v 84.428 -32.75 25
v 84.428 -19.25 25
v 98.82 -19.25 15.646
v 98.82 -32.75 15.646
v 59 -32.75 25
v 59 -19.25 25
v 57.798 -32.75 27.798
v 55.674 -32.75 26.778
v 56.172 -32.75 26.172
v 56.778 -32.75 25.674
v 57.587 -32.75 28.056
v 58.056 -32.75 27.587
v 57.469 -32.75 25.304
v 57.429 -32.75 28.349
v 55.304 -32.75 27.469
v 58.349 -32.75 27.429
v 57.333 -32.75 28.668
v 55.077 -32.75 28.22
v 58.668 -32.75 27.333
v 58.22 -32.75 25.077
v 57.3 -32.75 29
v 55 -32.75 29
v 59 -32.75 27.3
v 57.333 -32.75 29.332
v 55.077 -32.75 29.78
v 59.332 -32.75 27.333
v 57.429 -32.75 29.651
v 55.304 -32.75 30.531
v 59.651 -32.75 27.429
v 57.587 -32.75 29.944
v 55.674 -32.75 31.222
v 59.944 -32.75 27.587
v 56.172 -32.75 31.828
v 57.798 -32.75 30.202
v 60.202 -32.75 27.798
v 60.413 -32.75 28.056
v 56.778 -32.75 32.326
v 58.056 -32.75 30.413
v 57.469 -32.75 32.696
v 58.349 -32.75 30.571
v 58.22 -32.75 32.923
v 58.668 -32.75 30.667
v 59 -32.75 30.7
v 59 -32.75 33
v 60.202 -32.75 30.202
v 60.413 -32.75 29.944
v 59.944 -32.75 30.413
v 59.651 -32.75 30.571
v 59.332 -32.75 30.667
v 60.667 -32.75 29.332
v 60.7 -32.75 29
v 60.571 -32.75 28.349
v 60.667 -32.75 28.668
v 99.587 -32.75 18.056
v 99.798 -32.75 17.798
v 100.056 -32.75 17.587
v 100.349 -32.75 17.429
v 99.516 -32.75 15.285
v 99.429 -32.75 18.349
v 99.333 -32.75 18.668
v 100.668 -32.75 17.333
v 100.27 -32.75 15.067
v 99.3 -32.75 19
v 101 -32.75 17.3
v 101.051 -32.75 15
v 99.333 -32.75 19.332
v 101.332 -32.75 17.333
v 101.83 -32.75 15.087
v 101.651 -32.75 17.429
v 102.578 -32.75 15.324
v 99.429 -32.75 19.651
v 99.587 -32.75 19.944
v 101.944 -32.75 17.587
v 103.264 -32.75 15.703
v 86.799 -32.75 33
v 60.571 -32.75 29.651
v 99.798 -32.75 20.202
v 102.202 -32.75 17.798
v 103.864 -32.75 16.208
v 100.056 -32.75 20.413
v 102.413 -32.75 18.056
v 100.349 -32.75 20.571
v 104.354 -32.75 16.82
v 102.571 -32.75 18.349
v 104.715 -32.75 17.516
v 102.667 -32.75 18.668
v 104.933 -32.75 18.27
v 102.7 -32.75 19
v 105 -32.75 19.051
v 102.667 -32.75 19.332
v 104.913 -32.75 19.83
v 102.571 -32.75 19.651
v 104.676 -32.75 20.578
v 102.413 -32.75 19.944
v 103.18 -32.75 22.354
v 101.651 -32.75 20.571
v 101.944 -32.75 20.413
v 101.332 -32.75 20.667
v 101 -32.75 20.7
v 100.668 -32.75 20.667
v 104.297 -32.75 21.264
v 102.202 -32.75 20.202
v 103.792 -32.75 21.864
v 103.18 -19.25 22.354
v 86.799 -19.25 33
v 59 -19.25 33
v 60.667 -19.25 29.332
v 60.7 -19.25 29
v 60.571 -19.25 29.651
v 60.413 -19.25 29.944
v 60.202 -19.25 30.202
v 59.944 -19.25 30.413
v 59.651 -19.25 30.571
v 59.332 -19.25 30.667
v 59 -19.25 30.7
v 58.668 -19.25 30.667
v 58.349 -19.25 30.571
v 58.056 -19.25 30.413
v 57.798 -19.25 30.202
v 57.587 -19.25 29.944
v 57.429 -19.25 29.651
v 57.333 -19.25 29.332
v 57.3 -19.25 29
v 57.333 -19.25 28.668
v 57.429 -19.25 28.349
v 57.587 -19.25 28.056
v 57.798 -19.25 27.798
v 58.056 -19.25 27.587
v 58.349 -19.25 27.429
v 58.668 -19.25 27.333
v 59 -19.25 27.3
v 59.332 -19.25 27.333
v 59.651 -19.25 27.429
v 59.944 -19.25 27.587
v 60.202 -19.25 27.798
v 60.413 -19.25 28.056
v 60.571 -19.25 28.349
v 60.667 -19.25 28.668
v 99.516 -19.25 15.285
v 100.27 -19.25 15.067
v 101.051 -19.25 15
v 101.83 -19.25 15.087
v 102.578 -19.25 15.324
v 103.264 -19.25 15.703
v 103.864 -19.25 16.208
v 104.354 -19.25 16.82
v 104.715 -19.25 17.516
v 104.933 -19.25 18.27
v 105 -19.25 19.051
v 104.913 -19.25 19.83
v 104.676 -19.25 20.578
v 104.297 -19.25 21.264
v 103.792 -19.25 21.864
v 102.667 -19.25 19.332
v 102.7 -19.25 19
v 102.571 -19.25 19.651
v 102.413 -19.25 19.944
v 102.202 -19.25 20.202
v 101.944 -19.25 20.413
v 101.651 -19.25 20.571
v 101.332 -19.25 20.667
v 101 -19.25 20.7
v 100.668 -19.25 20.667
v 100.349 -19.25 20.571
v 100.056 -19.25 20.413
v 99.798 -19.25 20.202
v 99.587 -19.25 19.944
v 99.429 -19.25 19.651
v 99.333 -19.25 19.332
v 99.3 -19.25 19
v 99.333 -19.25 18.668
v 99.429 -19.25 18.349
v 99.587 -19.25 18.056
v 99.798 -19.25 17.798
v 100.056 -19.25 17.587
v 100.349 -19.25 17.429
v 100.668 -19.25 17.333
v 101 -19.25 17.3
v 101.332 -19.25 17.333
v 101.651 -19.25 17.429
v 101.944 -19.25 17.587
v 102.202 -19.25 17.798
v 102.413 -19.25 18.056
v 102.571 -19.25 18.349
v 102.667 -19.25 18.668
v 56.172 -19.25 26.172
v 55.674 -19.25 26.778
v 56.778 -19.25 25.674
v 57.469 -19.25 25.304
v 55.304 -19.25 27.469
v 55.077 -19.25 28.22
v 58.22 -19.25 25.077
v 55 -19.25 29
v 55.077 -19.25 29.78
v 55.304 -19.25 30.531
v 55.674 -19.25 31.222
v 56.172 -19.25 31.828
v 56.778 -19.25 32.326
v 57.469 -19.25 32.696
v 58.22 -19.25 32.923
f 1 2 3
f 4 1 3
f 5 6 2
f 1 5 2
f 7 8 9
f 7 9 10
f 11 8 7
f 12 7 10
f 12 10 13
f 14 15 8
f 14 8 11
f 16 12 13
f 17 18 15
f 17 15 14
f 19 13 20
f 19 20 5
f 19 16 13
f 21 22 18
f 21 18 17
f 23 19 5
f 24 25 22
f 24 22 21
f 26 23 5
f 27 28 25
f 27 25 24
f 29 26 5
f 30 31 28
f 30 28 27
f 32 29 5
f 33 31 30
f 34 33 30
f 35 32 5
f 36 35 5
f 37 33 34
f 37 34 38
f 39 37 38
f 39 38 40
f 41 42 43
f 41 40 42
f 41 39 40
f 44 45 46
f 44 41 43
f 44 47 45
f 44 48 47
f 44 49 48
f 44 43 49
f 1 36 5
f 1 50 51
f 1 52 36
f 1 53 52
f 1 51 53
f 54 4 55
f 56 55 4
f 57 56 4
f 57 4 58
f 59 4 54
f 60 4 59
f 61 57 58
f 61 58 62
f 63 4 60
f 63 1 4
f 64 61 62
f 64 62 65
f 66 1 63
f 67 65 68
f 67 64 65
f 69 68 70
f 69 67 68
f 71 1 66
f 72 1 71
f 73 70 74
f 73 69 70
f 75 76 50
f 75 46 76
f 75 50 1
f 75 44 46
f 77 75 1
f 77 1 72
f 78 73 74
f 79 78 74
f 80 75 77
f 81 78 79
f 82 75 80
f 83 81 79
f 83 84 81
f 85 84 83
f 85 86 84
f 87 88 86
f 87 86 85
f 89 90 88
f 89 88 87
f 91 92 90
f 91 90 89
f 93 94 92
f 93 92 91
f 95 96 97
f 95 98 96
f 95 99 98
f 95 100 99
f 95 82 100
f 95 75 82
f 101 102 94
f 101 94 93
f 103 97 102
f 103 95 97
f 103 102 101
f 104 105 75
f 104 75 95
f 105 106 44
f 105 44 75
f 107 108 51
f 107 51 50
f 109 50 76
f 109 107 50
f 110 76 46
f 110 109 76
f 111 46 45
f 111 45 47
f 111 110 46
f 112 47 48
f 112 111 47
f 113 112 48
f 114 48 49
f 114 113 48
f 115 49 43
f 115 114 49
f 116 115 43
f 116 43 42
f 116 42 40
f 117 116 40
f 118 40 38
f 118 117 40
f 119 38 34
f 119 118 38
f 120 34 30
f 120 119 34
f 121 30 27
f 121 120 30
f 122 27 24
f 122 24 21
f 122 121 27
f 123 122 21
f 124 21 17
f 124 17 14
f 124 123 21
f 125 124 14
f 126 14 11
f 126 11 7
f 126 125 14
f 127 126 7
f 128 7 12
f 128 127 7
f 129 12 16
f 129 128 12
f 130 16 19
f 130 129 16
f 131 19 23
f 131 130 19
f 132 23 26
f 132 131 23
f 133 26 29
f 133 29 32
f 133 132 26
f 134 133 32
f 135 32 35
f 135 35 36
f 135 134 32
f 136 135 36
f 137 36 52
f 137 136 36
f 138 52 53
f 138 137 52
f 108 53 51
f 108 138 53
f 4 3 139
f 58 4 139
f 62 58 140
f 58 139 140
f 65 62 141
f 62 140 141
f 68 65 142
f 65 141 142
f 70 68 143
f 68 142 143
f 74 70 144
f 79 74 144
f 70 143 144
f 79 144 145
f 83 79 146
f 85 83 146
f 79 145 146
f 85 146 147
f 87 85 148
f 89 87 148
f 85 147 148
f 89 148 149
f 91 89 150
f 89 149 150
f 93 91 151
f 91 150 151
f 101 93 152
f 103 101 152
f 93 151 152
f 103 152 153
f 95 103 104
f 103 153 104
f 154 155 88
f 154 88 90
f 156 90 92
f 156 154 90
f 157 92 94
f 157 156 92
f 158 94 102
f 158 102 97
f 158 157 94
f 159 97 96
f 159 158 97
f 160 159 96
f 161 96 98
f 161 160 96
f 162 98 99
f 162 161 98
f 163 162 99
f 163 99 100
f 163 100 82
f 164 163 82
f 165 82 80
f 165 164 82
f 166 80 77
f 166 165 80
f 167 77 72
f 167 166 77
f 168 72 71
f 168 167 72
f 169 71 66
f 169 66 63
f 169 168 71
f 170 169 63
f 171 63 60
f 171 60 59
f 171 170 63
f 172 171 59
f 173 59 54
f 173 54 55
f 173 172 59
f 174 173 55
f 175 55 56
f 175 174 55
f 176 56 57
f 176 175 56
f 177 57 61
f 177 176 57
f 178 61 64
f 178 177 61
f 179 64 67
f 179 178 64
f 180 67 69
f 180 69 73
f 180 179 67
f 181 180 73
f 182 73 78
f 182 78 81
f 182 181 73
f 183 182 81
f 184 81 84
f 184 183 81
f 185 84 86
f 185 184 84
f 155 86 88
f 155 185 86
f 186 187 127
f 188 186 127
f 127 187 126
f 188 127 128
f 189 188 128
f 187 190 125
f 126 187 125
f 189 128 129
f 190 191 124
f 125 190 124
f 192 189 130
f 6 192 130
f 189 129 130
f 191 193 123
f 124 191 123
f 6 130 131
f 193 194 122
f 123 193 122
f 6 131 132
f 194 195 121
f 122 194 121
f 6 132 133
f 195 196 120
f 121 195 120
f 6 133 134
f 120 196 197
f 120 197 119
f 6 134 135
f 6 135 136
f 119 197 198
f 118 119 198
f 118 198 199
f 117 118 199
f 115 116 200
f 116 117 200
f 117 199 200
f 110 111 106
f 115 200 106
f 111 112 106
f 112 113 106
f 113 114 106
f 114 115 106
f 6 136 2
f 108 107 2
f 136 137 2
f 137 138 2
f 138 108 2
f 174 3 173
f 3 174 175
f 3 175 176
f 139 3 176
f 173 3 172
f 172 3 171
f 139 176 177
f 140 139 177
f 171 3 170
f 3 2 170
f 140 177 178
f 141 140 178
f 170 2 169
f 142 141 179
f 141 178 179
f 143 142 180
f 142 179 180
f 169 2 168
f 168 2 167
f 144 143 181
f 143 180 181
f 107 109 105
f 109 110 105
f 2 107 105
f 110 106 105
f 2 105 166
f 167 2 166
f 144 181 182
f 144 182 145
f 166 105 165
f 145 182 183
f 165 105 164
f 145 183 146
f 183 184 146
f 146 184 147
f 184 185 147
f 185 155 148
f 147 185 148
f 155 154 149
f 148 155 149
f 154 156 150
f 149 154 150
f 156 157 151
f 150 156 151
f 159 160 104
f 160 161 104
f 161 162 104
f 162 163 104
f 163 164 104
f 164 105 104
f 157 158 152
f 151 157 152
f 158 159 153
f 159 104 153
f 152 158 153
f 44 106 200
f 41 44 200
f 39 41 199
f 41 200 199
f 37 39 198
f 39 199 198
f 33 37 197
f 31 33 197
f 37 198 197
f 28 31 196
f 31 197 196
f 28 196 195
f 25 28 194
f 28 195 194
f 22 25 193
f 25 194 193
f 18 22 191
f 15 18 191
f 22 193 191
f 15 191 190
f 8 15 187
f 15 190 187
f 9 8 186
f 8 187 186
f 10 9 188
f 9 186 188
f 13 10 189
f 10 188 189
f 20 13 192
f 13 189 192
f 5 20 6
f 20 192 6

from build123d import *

# Parameters (mm, degrees)
SKETCH007_R  = 1.7
PAD007_DEPTH = 13.5


with BuildPart() as clone_of_lega:
    # Sketch007 → Pad007 (new body)
    with BuildSketch(Plane(origin=(0, 19.25, 0), x_dir=(-1, 0, 0), z_dir=(0, 1, 0))):
        with BuildLine():
            ThreePointArc((59, 33), (55, 29), (59, 25))
            Line((59, 25), (84.428048, 25))
            Line((84.428048, 25), (98.820237, 15.646102))
            ThreePointArc((98.820237, 15.646102), (104.353886, 16.820218), (103.1798, 22.353874))
            Line((86.799351, 33), (103.1798, 22.353874))
            Line((59, 33), (86.799351, 33))
        make_face()
        with Locations((59, 29)):
            Circle(SKETCH007_R, mode=Mode.SUBTRACT)
        with Locations((101, 19)):
            Circle(SKETCH007_R, mode=Mode.SUBTRACT)
    extrude(amount=PAD007_DEPTH)


with BuildPart() as part_mirroring014:
    # Part__Mirroring014: instance of Clone of legA
    add(clone_of_lega.part.mirror(Plane(origin=(0, 0, 0), x_dir=(0, -1, 0), z_dir=(1, 0, 0))))


with BuildPart() as part_mirroring022:
    # Part__Mirroring022: instance of Part__Mirroring014
    add(part_mirroring014.part.mirror(Plane(origin=(67.968658, 4e-06, 24.002777), x_dir=(1, 0, 0), z_dir=(0, 1, 0))))


solid = part_mirroring022.part
